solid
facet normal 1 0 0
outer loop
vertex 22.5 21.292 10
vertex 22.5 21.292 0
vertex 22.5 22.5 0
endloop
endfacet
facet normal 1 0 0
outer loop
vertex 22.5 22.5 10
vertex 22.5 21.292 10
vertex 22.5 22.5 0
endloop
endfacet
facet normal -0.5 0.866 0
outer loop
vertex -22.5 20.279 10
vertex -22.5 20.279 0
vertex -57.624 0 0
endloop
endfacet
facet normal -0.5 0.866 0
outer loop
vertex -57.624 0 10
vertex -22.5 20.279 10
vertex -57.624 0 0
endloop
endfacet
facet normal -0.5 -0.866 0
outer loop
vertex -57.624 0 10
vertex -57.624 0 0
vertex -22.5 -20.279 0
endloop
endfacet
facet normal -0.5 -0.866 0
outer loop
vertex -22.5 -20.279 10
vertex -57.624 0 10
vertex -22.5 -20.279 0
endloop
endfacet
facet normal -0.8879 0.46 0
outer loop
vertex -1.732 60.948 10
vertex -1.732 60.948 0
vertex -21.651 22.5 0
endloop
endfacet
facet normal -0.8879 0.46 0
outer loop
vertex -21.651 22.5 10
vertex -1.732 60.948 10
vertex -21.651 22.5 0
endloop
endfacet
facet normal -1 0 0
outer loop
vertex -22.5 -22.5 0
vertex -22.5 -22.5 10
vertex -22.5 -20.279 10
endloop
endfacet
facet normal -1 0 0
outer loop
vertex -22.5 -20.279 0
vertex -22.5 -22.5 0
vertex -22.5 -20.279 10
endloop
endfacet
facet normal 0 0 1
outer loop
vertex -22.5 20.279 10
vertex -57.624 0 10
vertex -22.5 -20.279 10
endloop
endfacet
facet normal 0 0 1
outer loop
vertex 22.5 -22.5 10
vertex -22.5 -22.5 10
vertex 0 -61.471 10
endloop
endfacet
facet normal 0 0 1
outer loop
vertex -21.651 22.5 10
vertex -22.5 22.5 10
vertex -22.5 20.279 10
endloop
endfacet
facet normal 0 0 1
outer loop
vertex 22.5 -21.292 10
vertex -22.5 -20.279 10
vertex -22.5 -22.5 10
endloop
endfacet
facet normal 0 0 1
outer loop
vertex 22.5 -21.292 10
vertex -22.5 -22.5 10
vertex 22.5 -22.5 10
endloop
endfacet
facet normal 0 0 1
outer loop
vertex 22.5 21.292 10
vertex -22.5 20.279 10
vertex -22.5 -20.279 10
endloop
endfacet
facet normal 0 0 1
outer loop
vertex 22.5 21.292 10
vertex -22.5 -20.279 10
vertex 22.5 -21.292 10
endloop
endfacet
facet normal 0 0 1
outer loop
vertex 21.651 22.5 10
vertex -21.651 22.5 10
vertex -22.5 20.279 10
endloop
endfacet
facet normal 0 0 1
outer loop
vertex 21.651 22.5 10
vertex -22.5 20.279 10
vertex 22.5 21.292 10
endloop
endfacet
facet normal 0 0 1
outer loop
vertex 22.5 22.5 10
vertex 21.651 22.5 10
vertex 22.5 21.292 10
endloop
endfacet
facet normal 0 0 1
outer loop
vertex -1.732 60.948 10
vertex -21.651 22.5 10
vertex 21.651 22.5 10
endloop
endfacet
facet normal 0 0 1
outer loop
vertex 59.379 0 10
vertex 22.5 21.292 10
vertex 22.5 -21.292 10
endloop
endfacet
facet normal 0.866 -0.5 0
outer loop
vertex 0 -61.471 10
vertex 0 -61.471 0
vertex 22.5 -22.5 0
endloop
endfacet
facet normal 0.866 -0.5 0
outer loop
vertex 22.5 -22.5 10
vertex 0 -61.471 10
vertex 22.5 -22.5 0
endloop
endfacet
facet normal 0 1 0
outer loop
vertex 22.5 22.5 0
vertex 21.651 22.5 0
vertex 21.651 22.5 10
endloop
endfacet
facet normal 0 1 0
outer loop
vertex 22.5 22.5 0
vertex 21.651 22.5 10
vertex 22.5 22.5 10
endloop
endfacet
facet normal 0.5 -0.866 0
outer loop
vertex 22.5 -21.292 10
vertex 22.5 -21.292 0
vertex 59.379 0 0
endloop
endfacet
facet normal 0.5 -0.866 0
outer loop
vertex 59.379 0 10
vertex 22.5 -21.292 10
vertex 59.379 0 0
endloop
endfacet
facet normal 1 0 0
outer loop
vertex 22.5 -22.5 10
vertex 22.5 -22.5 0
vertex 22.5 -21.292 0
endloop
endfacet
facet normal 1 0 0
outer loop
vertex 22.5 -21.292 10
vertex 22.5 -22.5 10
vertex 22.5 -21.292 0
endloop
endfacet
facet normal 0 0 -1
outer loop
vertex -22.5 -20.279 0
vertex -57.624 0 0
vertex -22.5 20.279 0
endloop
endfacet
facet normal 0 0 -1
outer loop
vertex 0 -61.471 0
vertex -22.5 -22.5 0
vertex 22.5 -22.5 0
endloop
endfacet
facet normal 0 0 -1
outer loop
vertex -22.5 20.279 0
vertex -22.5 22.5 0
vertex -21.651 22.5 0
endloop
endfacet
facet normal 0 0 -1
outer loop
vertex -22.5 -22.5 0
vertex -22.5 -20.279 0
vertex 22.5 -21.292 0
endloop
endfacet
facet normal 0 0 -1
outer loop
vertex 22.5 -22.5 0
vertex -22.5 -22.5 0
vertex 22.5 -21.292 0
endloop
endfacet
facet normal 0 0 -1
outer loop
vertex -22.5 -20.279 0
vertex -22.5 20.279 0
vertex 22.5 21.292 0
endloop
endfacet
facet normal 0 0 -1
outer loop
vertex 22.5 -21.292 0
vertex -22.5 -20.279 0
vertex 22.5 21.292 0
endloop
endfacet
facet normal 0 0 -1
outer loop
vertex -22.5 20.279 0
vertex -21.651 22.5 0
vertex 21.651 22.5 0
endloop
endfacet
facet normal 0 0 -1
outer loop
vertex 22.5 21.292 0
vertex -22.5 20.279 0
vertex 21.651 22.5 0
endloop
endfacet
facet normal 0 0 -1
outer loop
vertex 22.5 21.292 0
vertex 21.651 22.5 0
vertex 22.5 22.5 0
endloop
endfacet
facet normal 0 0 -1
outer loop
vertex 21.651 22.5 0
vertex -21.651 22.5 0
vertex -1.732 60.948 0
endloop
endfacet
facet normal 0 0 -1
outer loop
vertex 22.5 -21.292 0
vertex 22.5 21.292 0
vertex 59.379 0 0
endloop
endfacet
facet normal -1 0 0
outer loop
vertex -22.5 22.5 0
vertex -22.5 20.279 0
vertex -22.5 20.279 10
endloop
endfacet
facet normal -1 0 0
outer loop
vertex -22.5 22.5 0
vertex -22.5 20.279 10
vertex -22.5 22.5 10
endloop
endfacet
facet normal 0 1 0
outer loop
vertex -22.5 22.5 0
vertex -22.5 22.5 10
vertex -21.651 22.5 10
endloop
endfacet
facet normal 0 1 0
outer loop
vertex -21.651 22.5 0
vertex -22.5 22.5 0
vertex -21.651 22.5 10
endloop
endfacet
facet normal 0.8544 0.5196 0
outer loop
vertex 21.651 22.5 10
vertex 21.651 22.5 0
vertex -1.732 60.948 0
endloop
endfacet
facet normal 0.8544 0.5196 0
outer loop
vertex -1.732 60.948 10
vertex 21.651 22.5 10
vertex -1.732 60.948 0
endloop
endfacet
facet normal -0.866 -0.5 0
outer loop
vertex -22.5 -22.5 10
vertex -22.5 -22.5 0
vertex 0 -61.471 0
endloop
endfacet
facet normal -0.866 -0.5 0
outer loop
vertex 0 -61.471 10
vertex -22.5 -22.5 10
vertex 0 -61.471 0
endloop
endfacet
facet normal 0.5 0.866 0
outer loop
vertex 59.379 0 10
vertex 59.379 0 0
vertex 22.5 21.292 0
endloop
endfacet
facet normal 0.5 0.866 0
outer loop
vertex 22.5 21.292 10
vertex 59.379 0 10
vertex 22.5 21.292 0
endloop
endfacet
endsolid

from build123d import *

# Parameters (mm, degrees)
F0_W     = 45
F0_H     = 45
F1_DEPTH = 10
F3_DEPTH = 10
F5_DEPTH = 10
F7_DEPTH = 10
F9_DEPTH = 10


with BuildPart() as f1:
    # F0 (on Top) → F1 (new body)
    with BuildSketch(Plane.XY):
        Rectangle(F0_W, F0_H)
    extrude(amount=F1_DEPTH)

    # F2 (on Top) → F3 (join)
    with BuildSketch(Plane.XY):
        Polygon((-21.650635, 22.5), (21.650635, 22.5), (-1.732051, 60.948017), align=None)
    extrude(amount=F3_DEPTH)

    # F4 (on Top) → F5 (join)
    with BuildSketch(Plane.XY):
        Polygon((22.5, -21.292087), (59.378976, 0), (22.5, 21.292087), align=None)
    extrude(amount=F5_DEPTH)

    # F6 (on Top) → F7 (join)
    with BuildSketch(Plane.XY):
        Polygon((-22.5, -22.5), (0, -61.471143), (22.5, -22.5), align=None)
    extrude(amount=F7_DEPTH)

    # F8 (on Top) → F9 (join)
    with BuildSketch(Plane.XY):
        Polygon((-22.5, 20.278981), (-57.624225, 0), (-22.5, -20.278981), align=None)
    extrude(amount=F9_DEPTH)


solid = f1.part
